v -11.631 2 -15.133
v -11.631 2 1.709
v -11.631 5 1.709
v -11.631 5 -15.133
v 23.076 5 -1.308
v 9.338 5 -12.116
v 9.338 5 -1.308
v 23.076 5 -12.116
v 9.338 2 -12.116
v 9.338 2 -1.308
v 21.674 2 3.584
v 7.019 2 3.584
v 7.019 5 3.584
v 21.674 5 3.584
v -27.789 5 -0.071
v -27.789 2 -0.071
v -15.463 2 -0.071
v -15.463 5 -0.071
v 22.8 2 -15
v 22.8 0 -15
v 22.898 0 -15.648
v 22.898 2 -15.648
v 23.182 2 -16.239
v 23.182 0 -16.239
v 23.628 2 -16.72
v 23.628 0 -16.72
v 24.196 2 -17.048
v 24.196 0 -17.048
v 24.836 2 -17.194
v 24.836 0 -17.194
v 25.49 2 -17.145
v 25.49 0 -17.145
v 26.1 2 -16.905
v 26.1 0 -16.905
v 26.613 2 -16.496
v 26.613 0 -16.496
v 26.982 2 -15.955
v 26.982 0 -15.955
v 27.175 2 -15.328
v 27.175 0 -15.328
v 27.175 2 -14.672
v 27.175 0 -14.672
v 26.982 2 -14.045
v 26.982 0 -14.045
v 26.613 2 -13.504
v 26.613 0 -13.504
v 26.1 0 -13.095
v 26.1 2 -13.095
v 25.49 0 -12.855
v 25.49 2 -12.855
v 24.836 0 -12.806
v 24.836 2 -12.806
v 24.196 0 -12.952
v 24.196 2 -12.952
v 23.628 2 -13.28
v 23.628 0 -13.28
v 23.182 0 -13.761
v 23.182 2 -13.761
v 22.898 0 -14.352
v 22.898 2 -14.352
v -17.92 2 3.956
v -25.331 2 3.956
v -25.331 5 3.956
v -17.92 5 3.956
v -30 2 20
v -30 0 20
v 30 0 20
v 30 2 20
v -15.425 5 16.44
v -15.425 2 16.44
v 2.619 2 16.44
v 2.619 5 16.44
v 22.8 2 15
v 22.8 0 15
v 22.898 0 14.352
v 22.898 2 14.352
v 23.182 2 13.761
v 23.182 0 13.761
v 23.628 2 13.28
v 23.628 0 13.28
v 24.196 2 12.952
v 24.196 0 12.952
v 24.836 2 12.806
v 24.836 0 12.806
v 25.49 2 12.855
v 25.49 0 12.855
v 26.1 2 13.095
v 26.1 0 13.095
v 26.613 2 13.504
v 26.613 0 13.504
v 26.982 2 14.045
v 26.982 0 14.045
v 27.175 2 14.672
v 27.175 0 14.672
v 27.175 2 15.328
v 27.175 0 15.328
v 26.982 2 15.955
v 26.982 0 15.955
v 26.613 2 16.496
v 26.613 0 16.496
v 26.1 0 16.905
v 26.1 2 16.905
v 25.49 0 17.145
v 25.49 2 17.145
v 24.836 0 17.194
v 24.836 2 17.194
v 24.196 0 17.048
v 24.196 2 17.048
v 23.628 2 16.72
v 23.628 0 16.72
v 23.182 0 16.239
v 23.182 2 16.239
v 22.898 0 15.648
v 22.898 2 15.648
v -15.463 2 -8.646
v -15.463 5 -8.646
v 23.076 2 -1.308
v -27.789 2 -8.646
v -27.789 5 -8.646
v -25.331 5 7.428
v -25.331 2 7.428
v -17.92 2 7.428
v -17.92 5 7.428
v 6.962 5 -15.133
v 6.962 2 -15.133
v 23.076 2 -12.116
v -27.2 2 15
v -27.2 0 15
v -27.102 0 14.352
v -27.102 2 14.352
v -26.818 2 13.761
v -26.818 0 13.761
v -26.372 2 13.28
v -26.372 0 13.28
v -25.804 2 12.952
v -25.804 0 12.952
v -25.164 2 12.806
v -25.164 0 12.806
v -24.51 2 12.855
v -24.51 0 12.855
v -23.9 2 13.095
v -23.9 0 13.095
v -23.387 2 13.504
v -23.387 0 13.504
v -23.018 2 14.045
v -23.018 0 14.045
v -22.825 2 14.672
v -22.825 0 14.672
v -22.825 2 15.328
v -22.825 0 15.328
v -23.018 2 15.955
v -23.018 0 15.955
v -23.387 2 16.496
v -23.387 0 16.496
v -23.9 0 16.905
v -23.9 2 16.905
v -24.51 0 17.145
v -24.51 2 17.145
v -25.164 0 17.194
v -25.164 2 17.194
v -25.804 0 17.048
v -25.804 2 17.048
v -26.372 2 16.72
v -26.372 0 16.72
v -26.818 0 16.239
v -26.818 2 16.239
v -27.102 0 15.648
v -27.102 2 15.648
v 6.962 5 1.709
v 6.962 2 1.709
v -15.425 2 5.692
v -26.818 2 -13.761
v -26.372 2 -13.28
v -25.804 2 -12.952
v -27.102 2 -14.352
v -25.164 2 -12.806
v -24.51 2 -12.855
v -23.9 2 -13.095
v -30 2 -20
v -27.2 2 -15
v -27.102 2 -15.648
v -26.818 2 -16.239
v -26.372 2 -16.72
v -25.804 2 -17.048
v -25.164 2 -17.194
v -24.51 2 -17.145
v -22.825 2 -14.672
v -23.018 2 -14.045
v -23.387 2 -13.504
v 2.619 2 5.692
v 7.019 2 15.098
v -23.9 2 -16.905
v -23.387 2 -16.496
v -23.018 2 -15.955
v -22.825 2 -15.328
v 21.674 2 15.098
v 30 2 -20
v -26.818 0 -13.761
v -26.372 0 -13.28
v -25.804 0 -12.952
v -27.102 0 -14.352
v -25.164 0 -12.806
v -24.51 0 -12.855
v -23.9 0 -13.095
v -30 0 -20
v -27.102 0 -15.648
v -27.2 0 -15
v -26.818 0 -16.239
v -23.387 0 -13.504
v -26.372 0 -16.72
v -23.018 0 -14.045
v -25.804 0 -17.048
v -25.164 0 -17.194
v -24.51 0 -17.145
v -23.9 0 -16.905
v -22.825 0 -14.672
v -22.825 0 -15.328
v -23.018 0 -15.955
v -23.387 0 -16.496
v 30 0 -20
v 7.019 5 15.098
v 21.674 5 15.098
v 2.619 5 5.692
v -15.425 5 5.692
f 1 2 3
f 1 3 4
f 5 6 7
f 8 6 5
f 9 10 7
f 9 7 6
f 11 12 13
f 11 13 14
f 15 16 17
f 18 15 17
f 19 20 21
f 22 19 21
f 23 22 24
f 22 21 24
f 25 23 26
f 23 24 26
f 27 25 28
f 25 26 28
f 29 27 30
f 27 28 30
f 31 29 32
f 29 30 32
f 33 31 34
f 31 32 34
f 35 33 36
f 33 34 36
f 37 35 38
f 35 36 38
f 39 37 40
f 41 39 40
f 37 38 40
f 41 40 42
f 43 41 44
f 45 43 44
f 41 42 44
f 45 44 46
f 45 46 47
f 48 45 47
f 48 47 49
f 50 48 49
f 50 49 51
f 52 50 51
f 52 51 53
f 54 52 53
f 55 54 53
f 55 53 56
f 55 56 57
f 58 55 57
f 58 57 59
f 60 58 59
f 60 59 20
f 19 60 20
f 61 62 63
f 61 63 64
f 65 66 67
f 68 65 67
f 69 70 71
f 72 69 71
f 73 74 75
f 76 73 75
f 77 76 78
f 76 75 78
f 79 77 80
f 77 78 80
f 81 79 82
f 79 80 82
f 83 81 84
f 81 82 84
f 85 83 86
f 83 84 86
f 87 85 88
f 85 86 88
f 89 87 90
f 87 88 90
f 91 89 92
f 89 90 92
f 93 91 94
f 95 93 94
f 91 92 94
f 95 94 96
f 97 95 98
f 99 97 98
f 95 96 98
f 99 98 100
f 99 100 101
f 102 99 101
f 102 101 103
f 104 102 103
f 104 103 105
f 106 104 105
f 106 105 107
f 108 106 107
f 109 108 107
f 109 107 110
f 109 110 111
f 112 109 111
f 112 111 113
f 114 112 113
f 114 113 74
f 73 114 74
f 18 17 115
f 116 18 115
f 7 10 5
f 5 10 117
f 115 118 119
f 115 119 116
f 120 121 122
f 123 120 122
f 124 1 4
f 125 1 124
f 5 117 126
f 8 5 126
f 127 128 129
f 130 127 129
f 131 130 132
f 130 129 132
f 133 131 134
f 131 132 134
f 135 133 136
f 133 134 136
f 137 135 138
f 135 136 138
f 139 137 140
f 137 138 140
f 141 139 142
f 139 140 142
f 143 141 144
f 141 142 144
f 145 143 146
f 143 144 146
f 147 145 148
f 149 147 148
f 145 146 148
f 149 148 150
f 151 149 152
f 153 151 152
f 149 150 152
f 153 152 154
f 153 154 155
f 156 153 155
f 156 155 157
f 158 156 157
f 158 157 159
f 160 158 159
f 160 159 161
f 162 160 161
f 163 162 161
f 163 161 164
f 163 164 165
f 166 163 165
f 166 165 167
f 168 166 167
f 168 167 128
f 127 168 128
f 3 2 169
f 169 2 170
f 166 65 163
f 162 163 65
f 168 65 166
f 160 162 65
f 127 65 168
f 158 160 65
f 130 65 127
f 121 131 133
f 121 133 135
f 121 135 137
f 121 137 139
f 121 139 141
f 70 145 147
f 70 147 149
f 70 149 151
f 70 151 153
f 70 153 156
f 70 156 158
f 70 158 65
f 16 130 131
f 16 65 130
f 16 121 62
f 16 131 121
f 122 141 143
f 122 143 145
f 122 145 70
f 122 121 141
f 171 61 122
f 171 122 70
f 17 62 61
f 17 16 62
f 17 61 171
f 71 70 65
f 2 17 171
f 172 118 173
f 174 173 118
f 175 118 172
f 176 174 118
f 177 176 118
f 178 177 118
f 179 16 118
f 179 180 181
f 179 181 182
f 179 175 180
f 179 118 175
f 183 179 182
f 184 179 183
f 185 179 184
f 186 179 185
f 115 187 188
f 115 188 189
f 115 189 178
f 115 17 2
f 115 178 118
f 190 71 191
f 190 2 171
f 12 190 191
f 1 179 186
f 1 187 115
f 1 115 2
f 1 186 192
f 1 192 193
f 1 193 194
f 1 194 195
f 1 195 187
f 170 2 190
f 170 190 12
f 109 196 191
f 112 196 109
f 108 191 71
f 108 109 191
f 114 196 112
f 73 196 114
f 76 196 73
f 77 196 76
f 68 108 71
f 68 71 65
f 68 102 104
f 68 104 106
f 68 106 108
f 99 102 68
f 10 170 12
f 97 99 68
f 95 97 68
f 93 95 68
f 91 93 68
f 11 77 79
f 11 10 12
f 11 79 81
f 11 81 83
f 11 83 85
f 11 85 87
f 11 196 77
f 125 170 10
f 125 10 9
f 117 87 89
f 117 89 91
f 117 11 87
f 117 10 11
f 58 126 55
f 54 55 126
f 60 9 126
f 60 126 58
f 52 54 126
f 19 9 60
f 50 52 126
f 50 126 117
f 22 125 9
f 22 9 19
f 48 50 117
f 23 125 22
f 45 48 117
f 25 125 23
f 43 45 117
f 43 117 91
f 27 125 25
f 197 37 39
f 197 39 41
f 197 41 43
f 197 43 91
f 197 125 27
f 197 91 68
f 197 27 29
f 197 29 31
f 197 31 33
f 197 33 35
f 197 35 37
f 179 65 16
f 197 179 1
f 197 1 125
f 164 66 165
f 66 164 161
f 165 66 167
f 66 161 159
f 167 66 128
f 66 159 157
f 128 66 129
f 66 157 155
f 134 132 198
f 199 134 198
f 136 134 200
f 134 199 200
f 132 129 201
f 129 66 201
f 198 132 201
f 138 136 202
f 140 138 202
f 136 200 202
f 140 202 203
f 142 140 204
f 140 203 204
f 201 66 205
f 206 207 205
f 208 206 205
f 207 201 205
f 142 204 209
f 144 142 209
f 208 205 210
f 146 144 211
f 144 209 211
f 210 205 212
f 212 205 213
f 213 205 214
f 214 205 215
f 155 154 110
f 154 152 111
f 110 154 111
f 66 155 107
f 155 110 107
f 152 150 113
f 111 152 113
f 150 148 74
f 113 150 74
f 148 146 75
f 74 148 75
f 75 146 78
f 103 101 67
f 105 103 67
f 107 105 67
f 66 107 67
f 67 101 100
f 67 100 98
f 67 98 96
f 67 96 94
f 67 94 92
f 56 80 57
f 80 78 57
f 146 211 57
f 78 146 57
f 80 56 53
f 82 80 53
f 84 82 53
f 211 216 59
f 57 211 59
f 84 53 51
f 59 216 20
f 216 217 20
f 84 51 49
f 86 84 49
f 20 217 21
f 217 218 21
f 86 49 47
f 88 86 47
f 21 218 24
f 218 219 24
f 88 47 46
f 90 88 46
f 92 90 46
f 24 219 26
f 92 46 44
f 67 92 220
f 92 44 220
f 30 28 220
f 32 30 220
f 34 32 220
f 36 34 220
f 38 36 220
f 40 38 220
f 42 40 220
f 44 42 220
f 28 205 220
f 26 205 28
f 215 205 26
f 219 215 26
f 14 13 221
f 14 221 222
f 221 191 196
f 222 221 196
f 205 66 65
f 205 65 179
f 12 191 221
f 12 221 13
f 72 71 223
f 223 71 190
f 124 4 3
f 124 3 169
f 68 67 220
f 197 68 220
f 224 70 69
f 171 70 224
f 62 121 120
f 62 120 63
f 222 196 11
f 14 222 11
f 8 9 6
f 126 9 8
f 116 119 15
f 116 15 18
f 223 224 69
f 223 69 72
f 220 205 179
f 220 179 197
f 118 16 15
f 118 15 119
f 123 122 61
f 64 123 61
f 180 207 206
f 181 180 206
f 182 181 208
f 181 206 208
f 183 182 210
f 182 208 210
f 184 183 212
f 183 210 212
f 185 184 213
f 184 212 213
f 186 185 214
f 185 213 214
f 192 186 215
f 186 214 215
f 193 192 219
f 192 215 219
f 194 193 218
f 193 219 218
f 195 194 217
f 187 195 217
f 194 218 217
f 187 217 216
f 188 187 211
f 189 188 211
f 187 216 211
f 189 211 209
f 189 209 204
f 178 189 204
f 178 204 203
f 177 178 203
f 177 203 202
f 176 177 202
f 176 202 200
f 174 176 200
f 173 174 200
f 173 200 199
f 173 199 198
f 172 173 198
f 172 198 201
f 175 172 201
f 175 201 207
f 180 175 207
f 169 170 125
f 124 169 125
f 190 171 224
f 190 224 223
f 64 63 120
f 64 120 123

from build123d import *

# Parameters (mm, degrees)
SKETCH1_W                  = 60
SKETCH1_H                  = 40
BOSS_EXTRUDE1_DEPTH        = 2
SKETCH2_W                  = 12.326283063
SKETCH2_H                  = 8.575111395
SKETCH2_W_2                = 13.737384573
SKETCH2_H_2                = 10.808942535
SKETCH2_W_3                = 18.592828035
SKETCH2_H_3                = 16.842728436
SKETCH2_W_4                = 7.411585369
SKETCH2_H_4                = 3.471203566
SKETCH2_W_5                = 14.654892662
SKETCH2_H_5                = 11.51389599
SKETCH2_W_6                = 18.043574534
SKETCH2_H_6                = 10.748392007
BOSS_EXTRUDE2_DEPTH        = 3
F_4_4_4_4_DIAMETER_HOLE1_D = 4.4


with BuildPart() as part:
    # Sketch1 → Boss-Extrude1 (new body)
    with BuildSketch(Plane(origin=(0, 0, 0), x_dir=(1, 0, 0), z_dir=(0, 1, 0))):
        Rectangle(SKETCH1_W, SKETCH1_H)
    extrude(amount=BOSS_EXTRUDE1_DEPTH)

    # Sketch2 → Boss-Extrude2 (add)
    with BuildSketch(Plane(origin=(0, 2, 0), x_dir=(1, 0, 0), z_dir=(0, 1, 0))):
        with Locations((-21.625666124, 4.358295229)):
            Rectangle(SKETCH2_W, SKETCH2_H)
        with Locations((16.207165307, 6.711999232)):
            Rectangle(SKETCH2_W_2, SKETCH2_H_2)
        with Locations((-2.33436777, 6.711999232)):
            Rectangle(SKETCH2_W_3, SKETCH2_H_3)
        with Locations((-21.625666124, -5.692081798)):
            Rectangle(SKETCH2_W_4, SKETCH2_H_4)
        with Locations((14.346591679, -9.340896656)):
            Rectangle(SKETCH2_W_5, SKETCH2_H_5)
        with Locations((-6.403086195, -11.066277802)):
            Rectangle(SKETCH2_W_6, SKETCH2_H_6)
    extrude(amount=BOSS_EXTRUDE2_DEPTH)

    # Ø4.4 (4.4) Diameter Hole1 (through all)
    with Locations(Plane(origin=(0, 2, 0), x_dir=(1, 0, 0), z_dir=(0, 1, 0))):
        with Locations((-25, 15), (25, 15), (25, -15), (-25, -15)):
            Hole(F_4_4_4_4_DIAMETER_HOLE1_D / 2)


solid = part.part
